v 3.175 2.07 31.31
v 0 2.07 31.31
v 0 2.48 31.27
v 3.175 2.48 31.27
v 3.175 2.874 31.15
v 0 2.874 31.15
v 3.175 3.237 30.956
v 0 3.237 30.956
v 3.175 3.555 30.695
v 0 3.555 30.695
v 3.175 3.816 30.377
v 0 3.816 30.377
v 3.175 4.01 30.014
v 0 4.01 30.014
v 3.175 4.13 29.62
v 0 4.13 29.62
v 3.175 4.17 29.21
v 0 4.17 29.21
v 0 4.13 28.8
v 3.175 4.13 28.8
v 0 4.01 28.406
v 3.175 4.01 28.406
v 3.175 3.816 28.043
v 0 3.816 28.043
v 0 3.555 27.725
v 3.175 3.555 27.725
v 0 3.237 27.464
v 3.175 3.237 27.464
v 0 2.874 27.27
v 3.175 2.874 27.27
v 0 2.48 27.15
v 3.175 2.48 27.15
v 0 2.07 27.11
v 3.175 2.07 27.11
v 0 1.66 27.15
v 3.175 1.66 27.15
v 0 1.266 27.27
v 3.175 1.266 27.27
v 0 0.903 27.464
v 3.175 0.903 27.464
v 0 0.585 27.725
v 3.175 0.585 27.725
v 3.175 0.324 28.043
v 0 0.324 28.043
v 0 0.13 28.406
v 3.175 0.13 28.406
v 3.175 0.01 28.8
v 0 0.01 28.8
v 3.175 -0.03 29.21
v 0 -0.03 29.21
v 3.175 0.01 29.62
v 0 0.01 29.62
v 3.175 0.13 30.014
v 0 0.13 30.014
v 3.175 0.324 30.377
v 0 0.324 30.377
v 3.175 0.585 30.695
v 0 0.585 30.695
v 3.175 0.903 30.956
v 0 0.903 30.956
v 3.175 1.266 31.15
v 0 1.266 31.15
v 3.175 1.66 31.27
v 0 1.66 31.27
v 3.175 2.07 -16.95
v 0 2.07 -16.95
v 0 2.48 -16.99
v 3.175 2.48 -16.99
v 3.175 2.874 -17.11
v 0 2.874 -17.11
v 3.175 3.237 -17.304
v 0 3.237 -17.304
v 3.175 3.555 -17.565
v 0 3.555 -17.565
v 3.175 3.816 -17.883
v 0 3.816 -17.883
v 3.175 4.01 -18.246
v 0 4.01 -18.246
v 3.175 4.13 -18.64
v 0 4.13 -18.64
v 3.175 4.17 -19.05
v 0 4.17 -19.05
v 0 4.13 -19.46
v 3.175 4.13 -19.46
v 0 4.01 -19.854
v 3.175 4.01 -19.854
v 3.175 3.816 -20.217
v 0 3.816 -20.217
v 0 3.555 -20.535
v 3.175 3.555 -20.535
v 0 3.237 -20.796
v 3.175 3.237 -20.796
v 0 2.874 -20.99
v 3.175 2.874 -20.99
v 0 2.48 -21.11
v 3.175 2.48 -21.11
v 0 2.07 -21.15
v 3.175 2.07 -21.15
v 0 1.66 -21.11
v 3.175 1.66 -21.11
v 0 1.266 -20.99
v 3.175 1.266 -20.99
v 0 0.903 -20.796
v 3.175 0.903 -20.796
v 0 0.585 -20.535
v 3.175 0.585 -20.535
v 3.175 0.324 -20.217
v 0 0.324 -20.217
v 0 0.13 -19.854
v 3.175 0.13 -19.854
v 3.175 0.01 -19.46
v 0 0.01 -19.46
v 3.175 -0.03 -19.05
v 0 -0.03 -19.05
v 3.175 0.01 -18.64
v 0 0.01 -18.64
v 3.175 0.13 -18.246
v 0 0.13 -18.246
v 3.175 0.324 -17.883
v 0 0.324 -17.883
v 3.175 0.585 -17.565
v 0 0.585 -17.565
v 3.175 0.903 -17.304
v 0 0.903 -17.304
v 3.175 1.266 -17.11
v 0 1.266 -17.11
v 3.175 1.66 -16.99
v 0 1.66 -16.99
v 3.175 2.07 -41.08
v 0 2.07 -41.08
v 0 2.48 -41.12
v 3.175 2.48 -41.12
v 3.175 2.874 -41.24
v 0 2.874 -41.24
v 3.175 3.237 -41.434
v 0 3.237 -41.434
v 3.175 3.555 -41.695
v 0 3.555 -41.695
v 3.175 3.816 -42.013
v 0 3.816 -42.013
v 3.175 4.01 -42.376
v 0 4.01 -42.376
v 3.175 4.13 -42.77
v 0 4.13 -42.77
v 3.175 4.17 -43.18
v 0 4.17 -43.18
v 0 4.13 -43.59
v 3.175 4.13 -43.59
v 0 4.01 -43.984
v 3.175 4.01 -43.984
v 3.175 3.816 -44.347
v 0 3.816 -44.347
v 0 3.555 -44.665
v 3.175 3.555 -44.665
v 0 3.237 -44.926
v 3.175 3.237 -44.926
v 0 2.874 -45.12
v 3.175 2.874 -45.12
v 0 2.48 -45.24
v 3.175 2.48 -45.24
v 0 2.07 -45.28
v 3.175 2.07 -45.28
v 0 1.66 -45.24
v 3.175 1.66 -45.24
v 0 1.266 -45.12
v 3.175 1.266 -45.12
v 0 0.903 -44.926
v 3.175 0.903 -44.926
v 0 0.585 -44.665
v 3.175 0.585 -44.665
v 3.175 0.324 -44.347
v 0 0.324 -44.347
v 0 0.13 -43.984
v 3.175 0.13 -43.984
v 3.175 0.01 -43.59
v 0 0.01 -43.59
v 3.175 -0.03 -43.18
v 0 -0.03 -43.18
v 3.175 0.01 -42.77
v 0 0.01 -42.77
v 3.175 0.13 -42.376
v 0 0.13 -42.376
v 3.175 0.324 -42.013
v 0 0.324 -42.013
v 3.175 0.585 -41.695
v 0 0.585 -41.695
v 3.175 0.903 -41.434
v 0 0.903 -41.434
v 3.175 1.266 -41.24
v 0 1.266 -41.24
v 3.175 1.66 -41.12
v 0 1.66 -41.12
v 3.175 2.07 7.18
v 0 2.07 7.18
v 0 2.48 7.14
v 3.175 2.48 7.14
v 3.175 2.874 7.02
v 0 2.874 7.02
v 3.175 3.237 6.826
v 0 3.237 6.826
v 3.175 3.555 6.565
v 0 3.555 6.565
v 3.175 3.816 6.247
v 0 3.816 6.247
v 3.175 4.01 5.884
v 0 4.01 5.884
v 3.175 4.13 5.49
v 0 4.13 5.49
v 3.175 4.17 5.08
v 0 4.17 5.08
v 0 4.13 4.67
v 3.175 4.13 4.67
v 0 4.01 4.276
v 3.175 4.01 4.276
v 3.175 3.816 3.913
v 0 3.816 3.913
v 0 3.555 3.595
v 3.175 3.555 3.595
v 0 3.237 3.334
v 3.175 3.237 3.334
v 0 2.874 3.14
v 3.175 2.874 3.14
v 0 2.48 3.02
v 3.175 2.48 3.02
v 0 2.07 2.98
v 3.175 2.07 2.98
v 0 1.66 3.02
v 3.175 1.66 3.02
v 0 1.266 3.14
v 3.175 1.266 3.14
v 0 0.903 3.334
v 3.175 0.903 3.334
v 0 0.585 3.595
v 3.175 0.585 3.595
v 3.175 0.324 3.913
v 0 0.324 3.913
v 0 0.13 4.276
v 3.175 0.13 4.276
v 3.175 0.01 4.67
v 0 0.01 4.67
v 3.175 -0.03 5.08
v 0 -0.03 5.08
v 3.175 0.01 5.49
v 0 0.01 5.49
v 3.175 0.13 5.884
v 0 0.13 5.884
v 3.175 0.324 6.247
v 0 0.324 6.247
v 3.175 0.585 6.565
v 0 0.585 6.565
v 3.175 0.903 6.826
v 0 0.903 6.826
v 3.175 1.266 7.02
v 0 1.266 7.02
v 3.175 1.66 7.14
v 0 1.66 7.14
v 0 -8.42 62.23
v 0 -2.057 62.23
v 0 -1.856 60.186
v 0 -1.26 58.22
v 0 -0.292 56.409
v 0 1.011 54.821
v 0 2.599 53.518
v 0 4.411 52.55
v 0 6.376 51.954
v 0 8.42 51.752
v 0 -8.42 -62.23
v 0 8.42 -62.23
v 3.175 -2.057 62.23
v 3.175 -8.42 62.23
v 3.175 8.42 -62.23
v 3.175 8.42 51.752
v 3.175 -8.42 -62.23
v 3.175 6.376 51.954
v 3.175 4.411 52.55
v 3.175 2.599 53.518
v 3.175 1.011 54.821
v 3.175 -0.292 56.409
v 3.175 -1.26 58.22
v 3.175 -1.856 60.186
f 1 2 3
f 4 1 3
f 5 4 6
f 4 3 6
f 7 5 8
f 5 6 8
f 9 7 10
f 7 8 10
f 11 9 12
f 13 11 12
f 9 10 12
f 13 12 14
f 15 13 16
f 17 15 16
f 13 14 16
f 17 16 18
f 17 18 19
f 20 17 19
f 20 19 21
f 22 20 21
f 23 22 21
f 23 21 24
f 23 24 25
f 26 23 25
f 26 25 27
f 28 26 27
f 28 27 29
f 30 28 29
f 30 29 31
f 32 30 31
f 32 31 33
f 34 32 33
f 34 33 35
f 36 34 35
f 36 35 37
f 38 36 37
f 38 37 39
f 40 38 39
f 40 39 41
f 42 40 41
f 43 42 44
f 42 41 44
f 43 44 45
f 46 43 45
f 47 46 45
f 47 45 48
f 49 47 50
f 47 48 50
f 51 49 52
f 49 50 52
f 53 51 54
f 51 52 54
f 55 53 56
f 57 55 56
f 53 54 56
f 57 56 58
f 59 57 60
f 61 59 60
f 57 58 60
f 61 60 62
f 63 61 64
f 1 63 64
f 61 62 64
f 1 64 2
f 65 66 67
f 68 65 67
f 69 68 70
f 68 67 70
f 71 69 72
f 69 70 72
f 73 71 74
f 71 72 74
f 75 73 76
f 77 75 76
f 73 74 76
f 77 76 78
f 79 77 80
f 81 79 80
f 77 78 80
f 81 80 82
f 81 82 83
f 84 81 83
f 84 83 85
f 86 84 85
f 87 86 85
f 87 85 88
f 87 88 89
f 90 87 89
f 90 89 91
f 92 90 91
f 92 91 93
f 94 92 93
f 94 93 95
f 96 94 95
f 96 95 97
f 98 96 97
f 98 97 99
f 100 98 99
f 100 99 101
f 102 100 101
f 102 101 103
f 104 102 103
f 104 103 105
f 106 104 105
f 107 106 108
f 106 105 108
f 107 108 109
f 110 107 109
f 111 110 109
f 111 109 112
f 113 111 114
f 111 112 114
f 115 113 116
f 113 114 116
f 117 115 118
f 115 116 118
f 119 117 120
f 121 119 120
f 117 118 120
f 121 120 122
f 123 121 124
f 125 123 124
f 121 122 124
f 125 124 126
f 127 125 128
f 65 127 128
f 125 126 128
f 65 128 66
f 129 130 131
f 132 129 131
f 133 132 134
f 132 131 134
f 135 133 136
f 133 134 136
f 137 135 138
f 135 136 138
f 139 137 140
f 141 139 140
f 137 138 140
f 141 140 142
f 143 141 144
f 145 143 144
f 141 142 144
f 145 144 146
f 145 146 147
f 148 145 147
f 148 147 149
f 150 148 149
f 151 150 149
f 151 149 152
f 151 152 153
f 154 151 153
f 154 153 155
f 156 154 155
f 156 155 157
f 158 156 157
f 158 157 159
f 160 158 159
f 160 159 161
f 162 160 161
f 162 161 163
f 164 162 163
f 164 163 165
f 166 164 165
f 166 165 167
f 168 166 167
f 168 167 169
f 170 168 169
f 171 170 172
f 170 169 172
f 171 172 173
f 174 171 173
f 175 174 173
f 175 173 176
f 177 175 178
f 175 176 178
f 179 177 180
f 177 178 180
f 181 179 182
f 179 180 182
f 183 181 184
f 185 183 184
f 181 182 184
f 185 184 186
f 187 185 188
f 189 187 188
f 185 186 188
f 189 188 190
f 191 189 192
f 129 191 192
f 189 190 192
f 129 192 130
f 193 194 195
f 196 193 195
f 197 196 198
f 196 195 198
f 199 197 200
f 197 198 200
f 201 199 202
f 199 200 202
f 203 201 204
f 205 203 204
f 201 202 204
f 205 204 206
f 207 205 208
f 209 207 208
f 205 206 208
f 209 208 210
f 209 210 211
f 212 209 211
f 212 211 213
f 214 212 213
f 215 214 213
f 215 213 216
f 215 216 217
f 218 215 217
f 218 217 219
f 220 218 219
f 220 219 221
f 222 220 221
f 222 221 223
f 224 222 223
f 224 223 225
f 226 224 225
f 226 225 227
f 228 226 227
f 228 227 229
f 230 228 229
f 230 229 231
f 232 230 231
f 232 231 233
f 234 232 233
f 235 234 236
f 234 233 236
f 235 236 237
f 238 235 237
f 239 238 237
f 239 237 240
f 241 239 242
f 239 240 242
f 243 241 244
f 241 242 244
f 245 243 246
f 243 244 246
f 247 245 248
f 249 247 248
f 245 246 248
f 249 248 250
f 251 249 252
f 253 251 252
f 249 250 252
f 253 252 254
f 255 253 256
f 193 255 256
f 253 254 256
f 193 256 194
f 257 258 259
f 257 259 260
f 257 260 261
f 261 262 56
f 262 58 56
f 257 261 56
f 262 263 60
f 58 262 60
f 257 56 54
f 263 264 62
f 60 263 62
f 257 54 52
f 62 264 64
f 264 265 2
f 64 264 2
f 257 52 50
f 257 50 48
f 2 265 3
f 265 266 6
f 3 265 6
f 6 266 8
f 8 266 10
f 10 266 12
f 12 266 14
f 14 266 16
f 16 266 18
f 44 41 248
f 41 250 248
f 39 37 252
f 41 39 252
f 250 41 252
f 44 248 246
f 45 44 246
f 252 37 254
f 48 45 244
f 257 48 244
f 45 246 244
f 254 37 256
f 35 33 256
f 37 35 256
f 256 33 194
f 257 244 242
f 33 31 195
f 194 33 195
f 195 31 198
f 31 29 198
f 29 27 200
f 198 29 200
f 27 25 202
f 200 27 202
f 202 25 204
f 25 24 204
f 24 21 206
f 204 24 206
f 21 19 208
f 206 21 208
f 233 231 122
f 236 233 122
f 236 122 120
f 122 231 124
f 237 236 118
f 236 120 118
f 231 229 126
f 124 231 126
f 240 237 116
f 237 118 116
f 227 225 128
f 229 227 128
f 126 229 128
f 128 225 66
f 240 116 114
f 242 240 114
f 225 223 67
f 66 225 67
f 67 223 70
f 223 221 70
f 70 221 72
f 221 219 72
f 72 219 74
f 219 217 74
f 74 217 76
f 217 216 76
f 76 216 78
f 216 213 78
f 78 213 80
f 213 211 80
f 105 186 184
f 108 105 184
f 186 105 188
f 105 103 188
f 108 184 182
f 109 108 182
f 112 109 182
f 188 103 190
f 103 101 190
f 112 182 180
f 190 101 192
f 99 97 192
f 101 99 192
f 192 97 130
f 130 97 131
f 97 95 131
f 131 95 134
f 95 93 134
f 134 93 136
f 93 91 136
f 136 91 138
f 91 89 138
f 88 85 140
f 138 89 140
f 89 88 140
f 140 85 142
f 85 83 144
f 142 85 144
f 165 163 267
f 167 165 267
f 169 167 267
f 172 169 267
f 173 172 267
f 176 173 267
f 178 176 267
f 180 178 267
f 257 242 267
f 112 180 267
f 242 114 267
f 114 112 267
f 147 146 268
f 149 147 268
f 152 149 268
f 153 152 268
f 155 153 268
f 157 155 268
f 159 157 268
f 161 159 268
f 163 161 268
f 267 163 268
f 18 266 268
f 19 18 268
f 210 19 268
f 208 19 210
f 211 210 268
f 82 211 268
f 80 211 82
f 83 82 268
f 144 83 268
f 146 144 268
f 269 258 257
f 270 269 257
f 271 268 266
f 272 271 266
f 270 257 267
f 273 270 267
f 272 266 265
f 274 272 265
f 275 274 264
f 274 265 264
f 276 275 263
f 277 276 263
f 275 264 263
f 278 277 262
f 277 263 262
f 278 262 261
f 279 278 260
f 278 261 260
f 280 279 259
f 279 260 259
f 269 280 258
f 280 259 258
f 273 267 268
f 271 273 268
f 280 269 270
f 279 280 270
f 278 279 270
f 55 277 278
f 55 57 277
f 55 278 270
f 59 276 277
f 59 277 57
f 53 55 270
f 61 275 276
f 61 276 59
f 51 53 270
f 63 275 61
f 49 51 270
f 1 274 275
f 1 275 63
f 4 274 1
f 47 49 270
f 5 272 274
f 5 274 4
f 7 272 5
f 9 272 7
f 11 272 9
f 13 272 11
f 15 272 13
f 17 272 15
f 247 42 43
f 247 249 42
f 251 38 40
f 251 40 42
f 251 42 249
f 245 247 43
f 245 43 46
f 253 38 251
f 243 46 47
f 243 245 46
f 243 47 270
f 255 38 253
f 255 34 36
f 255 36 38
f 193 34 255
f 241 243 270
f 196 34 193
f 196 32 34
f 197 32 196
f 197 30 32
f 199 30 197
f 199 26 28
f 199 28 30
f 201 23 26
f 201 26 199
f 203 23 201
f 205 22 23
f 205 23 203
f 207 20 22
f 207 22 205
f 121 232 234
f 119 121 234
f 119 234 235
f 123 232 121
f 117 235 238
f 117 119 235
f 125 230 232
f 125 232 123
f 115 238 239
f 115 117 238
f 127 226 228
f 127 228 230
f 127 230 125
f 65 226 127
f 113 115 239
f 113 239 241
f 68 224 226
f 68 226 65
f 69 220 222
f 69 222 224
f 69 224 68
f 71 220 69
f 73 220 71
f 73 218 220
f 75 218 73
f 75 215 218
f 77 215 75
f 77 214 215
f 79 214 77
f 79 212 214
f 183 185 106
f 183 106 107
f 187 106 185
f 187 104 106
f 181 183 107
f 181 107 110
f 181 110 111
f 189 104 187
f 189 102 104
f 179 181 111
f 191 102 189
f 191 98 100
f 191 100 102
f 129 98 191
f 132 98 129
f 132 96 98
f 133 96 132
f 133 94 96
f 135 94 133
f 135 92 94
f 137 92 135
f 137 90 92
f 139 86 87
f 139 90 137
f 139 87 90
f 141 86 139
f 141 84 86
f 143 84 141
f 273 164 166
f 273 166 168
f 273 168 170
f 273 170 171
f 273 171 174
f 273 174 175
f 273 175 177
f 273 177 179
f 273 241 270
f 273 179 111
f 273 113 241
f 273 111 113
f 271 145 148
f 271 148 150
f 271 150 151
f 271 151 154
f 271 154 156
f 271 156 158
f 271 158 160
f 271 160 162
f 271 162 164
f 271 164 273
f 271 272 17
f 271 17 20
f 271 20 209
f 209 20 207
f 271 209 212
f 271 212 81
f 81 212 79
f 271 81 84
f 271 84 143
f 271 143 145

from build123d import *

# Parameters (mm, degrees)
BOSS_EXTRUDE1_DEPTH = 3.175
SKETCH3_R           = 2.1
CUT_EXTRUDE1_DEPTH  = 4.175


with BuildPart() as part:
    # Sketch1 → Boss-Extrude1 (new body)
    with BuildSketch(Plane(origin=(0, 0, 0), x_dir=(0, 0, -1), z_dir=(1, 0, 0))):
        with BuildLine():
            Line((-62.23, -8.4201), (62.23, -8.4201))
            Line((62.23, -8.4201), (62.23, 8.4201))
            Line((62.23, 8.4201), (-51.7525, 8.4201))
            ThreePointArc((-51.7525, 8.4201), (-54.8212887, 1.0113887), (-62.23, -2.0574))
            Line((-62.23, -2.0574), (-62.23, -8.4201))
        make_face()
    extrude(amount=BOSS_EXTRUDE1_DEPTH)

    # Sketch3 → Cut-Extrude1 (cut, through all)
    with BuildSketch(Plane.ZY):
        with Locations((-43.18, 2.0701)):
            Circle(SKETCH3_R)
        with Locations((-19.05, 2.0701)):
            Circle(SKETCH3_R)
        with Locations((5.08, 2.0701)):
            Circle(SKETCH3_R)
        with Locations((29.21, 2.0701)):
            Circle(SKETCH3_R)
    extrude(amount=-CUT_EXTRUDE1_DEPTH, mode=Mode.SUBTRACT)


solid = part.part
